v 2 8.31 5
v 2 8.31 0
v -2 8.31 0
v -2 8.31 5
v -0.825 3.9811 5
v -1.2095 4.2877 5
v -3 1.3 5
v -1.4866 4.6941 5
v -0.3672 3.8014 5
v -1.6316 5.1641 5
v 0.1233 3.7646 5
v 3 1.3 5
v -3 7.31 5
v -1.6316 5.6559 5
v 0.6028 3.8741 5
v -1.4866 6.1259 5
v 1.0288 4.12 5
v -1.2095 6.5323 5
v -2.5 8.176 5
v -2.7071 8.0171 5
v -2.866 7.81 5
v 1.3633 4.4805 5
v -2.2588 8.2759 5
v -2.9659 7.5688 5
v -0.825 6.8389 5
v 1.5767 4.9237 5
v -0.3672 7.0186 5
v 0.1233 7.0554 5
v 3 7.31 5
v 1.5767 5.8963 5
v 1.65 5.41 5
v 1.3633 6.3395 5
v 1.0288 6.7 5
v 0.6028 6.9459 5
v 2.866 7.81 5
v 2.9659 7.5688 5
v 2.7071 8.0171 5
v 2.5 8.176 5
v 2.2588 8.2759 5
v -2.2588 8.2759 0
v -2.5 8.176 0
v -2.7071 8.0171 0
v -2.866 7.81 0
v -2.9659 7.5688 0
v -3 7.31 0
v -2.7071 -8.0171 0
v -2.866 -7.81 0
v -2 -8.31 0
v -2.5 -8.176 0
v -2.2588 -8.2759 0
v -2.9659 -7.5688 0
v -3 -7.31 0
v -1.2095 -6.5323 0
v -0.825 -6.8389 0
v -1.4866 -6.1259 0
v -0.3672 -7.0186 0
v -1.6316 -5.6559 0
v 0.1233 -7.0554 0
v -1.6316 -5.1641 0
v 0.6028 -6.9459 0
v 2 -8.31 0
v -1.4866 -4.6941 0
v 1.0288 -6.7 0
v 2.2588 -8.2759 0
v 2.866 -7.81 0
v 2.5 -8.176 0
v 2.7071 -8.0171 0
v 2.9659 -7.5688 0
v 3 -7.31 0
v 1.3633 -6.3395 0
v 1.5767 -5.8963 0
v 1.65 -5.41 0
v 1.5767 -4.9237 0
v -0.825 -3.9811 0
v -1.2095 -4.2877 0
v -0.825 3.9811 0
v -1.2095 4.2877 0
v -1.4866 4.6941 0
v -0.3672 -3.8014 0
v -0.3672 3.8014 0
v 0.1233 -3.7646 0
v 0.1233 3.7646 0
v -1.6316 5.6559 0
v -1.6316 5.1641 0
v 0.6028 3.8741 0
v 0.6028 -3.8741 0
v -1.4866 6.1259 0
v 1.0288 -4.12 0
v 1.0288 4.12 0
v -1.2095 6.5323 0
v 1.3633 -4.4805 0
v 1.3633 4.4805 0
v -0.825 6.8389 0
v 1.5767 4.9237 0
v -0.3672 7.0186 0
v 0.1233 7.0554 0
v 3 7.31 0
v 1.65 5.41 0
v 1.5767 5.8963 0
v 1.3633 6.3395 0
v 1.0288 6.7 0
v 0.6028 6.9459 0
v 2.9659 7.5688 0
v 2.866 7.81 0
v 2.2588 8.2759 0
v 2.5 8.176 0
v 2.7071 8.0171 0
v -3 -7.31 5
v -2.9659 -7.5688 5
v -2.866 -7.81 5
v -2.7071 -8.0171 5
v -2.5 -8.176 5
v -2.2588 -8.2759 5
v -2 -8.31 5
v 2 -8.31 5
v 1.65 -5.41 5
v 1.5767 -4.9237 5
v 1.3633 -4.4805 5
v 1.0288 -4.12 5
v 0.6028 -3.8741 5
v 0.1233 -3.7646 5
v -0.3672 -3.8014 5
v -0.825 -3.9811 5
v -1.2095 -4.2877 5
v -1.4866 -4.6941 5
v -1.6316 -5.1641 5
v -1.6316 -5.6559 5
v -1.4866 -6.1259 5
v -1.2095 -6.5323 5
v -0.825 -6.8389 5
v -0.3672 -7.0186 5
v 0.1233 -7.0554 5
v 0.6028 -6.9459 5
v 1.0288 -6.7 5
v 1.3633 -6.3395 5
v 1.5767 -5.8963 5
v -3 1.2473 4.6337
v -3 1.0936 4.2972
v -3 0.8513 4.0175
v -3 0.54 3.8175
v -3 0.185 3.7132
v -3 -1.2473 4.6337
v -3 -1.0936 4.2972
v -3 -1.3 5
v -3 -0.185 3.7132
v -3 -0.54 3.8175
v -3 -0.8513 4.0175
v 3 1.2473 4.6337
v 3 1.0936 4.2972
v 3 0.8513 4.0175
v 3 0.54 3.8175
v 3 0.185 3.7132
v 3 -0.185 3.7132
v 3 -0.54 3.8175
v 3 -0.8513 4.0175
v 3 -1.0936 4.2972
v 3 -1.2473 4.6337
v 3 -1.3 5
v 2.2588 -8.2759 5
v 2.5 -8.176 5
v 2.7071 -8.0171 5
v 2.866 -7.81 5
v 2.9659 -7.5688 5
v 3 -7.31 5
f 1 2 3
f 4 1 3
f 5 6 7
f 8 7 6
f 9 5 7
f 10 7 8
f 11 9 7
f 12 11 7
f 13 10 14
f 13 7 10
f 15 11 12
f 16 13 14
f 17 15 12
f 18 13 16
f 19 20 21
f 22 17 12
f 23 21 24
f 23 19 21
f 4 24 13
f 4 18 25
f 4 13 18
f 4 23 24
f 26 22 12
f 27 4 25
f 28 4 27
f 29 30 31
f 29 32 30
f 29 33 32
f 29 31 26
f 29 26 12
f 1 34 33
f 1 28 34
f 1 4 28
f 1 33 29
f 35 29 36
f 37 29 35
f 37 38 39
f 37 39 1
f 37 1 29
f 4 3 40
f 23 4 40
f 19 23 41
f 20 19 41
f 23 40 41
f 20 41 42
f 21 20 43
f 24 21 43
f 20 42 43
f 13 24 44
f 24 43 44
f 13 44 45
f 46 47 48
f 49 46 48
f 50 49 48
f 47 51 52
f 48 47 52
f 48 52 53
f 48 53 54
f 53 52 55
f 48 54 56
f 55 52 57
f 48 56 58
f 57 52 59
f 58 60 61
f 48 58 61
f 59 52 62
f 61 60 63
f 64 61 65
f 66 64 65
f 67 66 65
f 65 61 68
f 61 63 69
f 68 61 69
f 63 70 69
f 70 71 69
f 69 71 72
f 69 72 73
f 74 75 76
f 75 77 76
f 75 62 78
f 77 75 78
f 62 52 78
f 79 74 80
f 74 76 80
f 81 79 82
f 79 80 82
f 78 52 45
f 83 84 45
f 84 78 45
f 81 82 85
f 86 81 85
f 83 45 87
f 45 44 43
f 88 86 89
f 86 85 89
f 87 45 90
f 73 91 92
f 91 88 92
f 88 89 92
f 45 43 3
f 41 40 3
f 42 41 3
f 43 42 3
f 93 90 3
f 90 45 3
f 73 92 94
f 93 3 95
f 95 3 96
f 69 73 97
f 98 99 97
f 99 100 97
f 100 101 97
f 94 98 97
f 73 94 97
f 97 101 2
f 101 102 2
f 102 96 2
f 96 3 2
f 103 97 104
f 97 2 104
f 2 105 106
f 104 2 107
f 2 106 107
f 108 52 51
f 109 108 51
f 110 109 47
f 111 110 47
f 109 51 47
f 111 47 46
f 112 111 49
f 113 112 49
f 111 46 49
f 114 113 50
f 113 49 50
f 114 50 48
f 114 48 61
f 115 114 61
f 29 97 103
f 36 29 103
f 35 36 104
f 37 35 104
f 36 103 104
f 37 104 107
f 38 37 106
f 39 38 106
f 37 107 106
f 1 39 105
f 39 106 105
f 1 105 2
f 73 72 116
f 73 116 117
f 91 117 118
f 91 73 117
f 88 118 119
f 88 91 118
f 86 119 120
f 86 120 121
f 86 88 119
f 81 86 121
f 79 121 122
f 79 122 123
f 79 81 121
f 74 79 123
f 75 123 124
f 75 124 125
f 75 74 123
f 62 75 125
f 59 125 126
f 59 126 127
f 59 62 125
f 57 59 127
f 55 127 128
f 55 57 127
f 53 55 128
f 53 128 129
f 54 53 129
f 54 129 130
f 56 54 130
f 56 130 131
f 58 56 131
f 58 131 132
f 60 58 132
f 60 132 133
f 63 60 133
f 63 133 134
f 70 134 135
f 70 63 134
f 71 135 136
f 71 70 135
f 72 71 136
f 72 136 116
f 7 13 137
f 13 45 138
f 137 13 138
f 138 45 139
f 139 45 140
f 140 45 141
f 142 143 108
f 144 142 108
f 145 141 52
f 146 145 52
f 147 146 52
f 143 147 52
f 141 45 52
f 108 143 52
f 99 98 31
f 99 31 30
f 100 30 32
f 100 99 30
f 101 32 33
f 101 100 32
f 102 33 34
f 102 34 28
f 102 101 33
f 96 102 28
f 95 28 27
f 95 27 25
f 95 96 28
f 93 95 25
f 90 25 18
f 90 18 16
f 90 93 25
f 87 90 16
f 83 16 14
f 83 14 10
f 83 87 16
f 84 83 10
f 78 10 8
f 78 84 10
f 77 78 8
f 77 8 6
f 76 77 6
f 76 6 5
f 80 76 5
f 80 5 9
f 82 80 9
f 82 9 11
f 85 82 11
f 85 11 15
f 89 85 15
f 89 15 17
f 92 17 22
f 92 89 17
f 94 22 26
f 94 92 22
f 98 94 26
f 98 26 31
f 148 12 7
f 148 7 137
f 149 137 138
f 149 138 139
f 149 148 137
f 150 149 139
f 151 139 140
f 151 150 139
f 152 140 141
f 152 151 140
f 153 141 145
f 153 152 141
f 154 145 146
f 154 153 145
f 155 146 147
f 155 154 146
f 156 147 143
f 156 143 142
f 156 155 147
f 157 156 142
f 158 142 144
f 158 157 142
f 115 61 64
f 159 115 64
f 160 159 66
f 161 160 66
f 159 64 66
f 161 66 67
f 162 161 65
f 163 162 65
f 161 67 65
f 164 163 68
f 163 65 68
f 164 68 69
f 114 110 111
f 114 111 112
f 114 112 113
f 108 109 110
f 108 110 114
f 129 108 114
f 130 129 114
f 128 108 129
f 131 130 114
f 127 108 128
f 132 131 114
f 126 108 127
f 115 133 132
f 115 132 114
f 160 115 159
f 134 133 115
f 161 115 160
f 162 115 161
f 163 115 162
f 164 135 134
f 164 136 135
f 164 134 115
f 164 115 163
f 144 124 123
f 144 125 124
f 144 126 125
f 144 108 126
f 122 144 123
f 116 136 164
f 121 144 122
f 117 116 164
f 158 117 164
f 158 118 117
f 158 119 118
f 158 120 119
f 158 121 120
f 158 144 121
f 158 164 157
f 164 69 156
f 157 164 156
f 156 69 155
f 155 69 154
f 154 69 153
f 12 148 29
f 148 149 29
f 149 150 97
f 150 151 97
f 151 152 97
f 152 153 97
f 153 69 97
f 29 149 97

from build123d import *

# Parameters (mm, degrees)
SKETCH1_R           = 1.65
BOSS_EXTRUDE1_DEPTH = 5
CUT_EXTRUDE1_DEPTH  = 6


with BuildPart() as part:
    # Sketch1 → Boss-Extrude1 (new body)
    with BuildSketch(Plane.XY):
        with BuildLine():
            Line((-2, -8.31), (2, -8.31))
            ThreePointArc((2, -8.31), (2.707106781, -8.017106781), (3, -7.31))
            Line((3, -7.31), (3, 7.31))
            ThreePointArc((3, 7.31), (2.707106781, 8.017106781), (2, 8.31))
            Line((2, 8.31), (-2, 8.31))
            ThreePointArc((-2, 8.31), (-2.707106781, 8.017106781), (-3, 7.31))
            Line((-3, 7.31), (-3, -7.31))
            ThreePointArc((-3, -7.31), (-2.707106781, -8.017106781), (-2, -8.31))
        make_face()
        with Locations((0, -5.41)):
            Circle(SKETCH1_R, mode=Mode.SUBTRACT)
        with Locations((0, 5.41)):
            Circle(SKETCH1_R, mode=Mode.SUBTRACT)
    extrude(amount=BOSS_EXTRUDE1_DEPTH)

    # Sketch2 → Cut-Extrude1 (cut)
    with BuildSketch(Plane(origin=(3, 0, 0), x_dir=(0, 0, -1), z_dir=(1, 0, 0))):
        with BuildLine():
            Line((-5, -1.3), (-5, 1.3))
            ThreePointArc((-5, 1.3), (-3.7, 0), (-5, -1.3))
        make_face()
    extrude(amount=-CUT_EXTRUDE1_DEPTH, mode=Mode.SUBTRACT)


solid = part.part
